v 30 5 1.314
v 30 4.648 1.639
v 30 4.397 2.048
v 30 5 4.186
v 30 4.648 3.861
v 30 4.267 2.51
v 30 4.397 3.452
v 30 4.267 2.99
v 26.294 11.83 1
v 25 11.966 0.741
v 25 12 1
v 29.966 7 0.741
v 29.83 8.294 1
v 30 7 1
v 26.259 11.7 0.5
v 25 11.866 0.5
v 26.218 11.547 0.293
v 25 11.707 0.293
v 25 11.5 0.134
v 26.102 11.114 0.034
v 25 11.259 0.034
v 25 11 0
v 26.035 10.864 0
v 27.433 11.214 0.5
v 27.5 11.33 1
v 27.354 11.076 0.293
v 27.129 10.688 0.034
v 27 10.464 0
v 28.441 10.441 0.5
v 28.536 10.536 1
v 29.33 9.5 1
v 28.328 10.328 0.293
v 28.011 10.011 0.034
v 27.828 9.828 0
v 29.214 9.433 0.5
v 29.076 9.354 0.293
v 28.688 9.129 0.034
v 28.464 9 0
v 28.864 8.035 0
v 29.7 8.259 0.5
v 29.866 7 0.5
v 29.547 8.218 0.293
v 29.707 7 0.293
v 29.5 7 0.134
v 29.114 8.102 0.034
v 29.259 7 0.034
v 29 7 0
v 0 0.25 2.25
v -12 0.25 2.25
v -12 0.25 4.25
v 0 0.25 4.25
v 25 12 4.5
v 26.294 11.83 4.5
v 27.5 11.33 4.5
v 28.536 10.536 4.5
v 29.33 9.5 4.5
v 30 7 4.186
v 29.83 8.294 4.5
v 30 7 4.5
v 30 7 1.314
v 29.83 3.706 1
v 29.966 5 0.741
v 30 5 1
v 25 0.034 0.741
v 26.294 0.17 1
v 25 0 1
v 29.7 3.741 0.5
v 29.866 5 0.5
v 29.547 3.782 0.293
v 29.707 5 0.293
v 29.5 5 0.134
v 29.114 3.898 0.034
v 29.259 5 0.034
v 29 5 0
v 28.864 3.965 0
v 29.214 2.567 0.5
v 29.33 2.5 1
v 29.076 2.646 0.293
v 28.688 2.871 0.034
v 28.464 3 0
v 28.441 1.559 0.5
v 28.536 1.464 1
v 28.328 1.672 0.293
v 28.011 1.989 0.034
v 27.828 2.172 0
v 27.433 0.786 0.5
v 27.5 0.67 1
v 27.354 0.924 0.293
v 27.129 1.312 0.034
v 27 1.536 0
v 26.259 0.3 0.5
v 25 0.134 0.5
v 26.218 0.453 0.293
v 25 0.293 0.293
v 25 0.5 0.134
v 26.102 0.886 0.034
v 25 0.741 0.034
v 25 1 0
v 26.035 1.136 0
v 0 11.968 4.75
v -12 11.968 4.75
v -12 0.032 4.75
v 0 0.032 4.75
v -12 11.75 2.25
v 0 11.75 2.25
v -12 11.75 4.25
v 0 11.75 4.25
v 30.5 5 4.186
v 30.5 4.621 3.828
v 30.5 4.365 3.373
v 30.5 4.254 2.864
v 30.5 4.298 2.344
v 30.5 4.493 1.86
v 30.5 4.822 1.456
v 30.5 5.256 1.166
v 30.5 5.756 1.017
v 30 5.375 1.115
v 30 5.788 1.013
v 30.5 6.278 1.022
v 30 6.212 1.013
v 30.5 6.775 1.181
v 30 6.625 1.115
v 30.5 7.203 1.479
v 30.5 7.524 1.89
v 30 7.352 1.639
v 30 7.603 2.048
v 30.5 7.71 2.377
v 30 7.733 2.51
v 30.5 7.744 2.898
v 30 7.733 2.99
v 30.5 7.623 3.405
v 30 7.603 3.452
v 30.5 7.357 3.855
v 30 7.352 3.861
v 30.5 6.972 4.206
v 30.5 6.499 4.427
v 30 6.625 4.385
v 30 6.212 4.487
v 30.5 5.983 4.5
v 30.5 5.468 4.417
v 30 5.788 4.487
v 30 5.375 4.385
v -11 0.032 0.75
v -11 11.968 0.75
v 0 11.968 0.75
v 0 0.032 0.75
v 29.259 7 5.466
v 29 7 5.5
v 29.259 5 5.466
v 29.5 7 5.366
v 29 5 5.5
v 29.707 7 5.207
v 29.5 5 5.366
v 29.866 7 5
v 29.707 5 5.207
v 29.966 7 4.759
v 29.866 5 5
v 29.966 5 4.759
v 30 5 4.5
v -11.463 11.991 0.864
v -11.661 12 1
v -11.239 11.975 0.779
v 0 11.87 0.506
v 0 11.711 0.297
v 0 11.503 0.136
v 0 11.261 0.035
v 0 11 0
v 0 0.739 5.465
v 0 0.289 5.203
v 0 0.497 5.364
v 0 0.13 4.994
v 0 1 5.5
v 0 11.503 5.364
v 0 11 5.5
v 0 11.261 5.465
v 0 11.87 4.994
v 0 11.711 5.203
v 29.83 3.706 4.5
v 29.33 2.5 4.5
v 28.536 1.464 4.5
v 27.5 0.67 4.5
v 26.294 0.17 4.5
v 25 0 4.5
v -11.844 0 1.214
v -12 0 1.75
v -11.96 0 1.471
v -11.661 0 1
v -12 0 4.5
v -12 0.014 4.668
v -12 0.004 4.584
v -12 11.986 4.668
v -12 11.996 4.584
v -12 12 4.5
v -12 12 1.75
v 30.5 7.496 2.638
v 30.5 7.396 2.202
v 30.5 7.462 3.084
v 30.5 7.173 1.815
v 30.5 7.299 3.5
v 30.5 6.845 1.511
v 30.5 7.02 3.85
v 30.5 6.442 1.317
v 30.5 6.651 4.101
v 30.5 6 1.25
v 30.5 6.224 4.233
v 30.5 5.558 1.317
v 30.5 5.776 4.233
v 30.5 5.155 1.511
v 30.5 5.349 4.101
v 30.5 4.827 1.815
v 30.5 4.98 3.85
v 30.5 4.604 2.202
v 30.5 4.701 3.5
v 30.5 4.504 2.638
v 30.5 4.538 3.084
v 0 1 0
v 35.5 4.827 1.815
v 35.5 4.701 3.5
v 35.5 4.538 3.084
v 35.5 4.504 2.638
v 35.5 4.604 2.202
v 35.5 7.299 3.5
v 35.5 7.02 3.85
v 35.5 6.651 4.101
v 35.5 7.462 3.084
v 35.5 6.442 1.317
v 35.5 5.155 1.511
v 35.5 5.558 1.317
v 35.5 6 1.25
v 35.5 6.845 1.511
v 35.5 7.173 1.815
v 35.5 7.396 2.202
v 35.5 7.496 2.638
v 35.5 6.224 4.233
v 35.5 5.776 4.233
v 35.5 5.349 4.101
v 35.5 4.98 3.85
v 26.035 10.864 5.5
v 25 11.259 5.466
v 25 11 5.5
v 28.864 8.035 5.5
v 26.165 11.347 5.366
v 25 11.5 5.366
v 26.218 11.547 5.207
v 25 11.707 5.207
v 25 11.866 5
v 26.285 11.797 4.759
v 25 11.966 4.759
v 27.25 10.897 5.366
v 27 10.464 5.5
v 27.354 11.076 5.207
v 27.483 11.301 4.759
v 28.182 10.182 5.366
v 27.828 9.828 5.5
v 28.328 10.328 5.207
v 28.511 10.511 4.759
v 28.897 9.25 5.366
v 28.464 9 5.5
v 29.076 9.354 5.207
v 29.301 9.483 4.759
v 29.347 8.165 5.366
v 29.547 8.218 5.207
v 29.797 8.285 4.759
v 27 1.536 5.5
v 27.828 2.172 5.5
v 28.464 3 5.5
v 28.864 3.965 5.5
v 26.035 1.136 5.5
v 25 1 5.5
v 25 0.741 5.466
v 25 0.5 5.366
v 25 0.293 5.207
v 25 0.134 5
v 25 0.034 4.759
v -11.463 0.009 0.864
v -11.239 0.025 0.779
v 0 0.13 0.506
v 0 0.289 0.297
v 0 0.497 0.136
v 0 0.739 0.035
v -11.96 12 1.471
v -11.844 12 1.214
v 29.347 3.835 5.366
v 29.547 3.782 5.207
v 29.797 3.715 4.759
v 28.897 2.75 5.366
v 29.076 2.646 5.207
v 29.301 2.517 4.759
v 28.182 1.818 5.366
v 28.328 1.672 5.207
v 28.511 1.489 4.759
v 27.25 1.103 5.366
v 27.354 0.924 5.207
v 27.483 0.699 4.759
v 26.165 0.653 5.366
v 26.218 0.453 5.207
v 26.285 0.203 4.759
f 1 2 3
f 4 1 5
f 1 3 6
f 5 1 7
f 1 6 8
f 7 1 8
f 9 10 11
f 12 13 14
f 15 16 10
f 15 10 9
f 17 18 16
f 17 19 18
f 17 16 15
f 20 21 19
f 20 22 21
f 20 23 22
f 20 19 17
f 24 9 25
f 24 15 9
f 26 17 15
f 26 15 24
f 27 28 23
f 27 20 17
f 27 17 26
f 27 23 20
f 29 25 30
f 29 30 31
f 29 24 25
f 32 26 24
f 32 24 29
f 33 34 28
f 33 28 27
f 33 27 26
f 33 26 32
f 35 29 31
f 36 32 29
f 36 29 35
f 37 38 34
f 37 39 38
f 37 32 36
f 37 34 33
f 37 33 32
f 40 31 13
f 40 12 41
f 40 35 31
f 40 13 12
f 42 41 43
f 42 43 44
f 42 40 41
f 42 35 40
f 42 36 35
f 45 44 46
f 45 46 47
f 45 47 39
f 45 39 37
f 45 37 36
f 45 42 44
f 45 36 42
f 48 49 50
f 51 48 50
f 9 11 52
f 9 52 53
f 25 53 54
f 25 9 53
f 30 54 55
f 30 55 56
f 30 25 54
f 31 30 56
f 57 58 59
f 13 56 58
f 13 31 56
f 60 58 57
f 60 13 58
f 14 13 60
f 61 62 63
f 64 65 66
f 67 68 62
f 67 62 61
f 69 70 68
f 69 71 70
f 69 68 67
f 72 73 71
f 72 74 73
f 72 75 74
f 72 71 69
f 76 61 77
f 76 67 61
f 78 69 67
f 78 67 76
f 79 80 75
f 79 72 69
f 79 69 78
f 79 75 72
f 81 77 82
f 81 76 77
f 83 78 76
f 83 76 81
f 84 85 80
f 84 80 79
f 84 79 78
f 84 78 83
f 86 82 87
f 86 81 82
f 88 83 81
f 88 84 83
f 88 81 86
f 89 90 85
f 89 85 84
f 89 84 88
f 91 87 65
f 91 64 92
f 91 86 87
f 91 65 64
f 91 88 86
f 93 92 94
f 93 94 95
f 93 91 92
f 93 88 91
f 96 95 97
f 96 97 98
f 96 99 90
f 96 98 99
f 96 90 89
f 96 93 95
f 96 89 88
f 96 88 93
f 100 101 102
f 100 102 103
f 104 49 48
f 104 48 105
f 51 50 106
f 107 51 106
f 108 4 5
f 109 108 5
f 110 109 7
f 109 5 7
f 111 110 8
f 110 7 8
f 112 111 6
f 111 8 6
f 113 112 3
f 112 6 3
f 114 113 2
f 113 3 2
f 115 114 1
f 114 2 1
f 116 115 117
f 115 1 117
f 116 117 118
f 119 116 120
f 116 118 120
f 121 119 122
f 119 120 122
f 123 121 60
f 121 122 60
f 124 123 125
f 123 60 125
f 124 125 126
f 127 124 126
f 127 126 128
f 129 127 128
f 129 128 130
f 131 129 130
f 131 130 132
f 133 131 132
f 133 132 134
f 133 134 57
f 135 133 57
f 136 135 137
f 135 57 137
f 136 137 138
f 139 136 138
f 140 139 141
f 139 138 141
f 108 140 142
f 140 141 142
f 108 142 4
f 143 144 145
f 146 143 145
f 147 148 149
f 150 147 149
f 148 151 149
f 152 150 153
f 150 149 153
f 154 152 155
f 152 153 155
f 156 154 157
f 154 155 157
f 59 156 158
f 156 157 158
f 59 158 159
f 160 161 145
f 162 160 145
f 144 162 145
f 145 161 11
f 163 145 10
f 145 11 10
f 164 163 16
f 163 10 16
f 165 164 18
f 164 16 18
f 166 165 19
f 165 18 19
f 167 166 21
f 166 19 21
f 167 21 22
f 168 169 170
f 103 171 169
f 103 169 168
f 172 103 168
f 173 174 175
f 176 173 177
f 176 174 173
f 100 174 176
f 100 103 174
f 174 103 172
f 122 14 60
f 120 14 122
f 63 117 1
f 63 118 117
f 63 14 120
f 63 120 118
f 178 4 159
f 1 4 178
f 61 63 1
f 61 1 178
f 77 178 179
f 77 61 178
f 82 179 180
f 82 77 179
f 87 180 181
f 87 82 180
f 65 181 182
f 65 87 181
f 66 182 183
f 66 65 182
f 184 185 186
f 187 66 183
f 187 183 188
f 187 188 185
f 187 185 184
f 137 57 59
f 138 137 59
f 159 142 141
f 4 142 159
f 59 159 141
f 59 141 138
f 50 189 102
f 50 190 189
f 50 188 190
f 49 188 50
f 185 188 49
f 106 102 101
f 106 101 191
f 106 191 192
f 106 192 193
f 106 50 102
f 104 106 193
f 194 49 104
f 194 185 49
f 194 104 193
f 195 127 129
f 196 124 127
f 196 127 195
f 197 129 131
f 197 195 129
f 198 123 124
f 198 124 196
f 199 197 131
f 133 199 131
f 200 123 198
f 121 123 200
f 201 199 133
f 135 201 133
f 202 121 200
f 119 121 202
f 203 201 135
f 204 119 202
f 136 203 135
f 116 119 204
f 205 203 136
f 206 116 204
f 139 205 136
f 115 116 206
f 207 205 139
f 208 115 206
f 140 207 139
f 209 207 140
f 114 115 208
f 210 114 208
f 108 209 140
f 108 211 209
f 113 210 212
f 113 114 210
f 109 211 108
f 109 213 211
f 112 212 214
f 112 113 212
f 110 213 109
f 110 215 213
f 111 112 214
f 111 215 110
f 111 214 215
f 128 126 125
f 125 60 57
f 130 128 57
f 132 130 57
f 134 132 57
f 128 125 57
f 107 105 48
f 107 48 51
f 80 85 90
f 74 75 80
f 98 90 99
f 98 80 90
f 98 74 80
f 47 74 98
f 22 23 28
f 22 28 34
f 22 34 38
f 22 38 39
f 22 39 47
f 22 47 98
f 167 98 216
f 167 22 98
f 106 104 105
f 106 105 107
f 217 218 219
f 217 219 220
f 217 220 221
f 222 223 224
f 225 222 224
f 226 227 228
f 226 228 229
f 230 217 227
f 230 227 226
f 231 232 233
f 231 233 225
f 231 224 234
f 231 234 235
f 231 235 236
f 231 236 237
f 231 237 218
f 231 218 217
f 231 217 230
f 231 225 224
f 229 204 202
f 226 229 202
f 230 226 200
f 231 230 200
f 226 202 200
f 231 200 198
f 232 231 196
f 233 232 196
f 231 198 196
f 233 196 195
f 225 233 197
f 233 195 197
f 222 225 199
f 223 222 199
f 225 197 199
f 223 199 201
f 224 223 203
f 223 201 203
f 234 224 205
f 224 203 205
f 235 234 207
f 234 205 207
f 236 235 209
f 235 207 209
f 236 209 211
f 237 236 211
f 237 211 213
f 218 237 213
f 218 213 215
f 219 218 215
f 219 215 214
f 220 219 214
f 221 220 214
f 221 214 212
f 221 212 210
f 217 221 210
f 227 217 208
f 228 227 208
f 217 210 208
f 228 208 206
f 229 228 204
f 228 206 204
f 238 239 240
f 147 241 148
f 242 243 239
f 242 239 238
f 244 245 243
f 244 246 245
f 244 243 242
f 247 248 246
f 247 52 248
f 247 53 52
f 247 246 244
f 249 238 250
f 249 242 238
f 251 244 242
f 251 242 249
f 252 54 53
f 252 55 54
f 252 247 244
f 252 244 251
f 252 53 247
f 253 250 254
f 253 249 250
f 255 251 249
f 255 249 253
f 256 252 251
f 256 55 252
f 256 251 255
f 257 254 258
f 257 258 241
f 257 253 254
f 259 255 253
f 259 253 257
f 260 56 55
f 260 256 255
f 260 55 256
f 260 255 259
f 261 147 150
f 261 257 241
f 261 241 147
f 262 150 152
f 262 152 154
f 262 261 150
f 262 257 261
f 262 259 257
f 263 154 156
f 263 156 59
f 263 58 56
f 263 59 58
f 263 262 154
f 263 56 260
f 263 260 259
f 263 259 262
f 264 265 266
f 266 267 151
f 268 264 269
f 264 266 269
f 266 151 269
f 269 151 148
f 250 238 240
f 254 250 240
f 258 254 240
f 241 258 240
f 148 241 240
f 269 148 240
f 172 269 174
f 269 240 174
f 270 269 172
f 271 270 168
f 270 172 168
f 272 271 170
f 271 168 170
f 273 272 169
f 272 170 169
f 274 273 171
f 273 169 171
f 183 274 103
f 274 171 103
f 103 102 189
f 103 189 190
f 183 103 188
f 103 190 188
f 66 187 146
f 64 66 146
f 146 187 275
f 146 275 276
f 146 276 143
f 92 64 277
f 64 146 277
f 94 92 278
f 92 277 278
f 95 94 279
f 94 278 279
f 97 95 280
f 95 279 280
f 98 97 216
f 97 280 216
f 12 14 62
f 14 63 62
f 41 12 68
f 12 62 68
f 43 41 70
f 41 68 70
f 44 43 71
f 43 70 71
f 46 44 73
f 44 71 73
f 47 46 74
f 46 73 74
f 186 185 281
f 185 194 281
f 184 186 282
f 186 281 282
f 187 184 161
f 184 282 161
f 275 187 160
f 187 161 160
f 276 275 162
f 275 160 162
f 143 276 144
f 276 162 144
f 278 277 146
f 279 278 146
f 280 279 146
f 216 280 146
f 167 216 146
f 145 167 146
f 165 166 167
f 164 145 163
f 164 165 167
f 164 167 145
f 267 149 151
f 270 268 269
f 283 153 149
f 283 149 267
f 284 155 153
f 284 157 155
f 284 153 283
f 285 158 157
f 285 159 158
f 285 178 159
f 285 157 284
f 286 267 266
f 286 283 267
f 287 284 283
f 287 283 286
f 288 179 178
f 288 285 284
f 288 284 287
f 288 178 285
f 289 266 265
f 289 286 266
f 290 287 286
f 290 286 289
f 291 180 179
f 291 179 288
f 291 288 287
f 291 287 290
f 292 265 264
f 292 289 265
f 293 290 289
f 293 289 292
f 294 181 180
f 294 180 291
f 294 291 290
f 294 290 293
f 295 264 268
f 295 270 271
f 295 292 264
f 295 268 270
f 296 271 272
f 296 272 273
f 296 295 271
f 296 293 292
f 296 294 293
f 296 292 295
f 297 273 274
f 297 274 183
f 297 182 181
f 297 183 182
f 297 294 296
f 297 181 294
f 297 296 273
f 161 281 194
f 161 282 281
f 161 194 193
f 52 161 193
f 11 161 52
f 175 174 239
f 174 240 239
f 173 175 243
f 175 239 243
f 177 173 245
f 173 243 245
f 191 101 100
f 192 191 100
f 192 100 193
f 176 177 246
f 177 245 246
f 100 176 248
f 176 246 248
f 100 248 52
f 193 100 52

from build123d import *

# Parameters (mm, degrees)
BOSS_EXTRU_1_DEPTH      = 5.5
ESQUISSE6_W             = 12
ESQUISSE6_H             = 12
BOSS_EXTRU_4_DEPTH      = 4
ESQUISSE7_R             = 1.75
BOSS_EXTRU_7_DEPTH      = 0.5
ESQUISSE8_R             = 1.5
BOSS_EXTRU_9_DEPTH      = 5
CONG_1_R                = 1
CONG_2_R                = 1
CONG_3_R                = 1
ESQUISSE9_W             = 2
ESQUISSE9_H             = 11.5
ENL_V_MAT_EXTRU_1_DEPTH = 12


with BuildPart() as part:
    # Esquisse1 → Boss.-Extru.1 (new body)
    with BuildSketch(Plane.XY):
        with BuildLine():
            ThreePointArc((25, 12), (28.535533906, 10.535533906), (30, 7))
            Line((30, 7), (30, 5))
            ThreePointArc((30, 5), (28.535533906, 1.464466094), (25, 0))
            Line((25, 0), (0, 0))
            Line((0, 0), (0, 12))
            Line((0, 12), (25, 12))
        make_face()
    extrude(amount=BOSS_EXTRU_1_DEPTH)

    # Esquisse6 → Boss.-Extru.4 (add)
    with BuildSketch(Plane.XY.offset(0.75)):
        with Locations((-6, 6)):
            Rectangle(ESQUISSE6_W, ESQUISSE6_H)
    extrude(amount=BOSS_EXTRU_4_DEPTH)

    # Esquisse7 → Boss.-Extru.7 (add)
    with BuildSketch(Plane(origin=(30, 0, 0), x_dir=(0, 0, -1), z_dir=(1, 0, 0))):
        with Locations(Location((-2.75, 6, 0), (0, 0, 214.849904579))):
            Circle(ESQUISSE7_R)
    extrude(amount=BOSS_EXTRU_7_DEPTH)

    # Esquisse8 → Boss.-Extru.9 (add)
    with BuildSketch(Plane(origin=(30.5, 0, 0), x_dir=(0, 0, -1), z_dir=(1, 0, 0))):
        with Locations((-2.75, 6)):
            Circle(ESQUISSE8_R)
    extrude(amount=BOSS_EXTRU_9_DEPTH)

    # Congé1
    cong_1_edges = [part.edges().sort_by_distance(p)[0] for p in [
        (12.5, 0, 5.5),
        (28.535533906, 1.464466094, 5.5),
        (30, 6, 5.5),
        (28.535533906, 10.535533906, 5.5),
        (12.5, 12, 5.5),
    ]]
    fillet(cong_1_edges, radius=CONG_1_R - 0.0001)  # a hair under: the kernel refuses the full size

    # Congé2
    cong_2_edges = [part.edges().sort_by_distance(p)[0] for p in [
        (-12, 6, 0.75),
    ]]
    fillet(cong_2_edges, radius=CONG_2_R)

    # Congé3
    cong_3_edges = [part.edges().sort_by_distance(p)[0] for p in [
        (12.5, 0, 0),
        (28.535533906, 1.464466094, 0),
        (30, 6, 0),
        (28.535533906, 10.535533906, 0),
        (12.5, 12, 0),
    ]]
    fillet(cong_3_edges, radius=CONG_3_R - 0.0001)  # a hair under: the kernel refuses the full size

    # Esquisse9 → Enlèv. mat.-Extru.1 (cut)
    with BuildSketch(Plane.ZY.offset(12)):
        with Locations((3.25, 6)):
            Rectangle(ESQUISSE9_W, ESQUISSE9_H)
    extrude(amount=-ENL_V_MAT_EXTRU_1_DEPTH, mode=Mode.SUBTRACT)


solid = part.part
